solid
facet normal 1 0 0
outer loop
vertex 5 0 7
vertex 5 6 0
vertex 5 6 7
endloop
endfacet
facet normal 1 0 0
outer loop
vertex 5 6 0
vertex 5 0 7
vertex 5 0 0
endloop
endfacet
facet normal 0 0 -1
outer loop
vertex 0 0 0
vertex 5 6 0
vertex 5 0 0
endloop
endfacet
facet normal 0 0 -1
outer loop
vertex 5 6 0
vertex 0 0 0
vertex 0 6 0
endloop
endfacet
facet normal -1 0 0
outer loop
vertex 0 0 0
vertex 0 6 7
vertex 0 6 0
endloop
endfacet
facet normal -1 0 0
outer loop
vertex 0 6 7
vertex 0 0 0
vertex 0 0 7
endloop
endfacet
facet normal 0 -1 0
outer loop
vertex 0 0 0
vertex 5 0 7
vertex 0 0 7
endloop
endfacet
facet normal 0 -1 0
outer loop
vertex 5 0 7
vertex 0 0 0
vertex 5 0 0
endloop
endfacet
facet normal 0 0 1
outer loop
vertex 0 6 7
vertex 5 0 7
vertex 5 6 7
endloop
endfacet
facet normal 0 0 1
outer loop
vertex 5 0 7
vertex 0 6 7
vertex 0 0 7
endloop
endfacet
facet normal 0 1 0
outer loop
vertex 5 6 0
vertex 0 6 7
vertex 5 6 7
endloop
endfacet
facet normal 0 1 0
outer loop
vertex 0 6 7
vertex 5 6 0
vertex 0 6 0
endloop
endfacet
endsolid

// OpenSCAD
translate([2.5, 1.5, 1.0]) color([0.8462248334797323, 0.9789066021625461, 0.6868956228130294]) cube([5, 3, 2], center=true);
translate([2.5, 1.5, 3.0]) color([0.08137290691060206, 0.9493092651810784, 0.9246190463677613]) cube([5, 3, 2], center=true);
translate([2.5, 1.0, 5.5]) color([0.3951154575230438, 0.3612783181755085, 0.11615210489091876]) cube([5, 2, 3], center=true);
translate([2.5, 3.0, 5.5]) color([0.0037403702712440756, 0.2703277384724262, 0.6403732426441148]) cube([5, 2, 3], center=true);
translate([2.5, 4.5, 1.0]) color([0.29252642189785794, 0.9007258804640697, 0.14067978971908934]) cube([5, 3, 2], center=true);
translate([2.5, 4.5, 3.0]) color([0.5728503338092871, 0.1912043400515635, 0.43401891336511733]) cube([5, 3, 2], center=true);
translate([2.5, 5.0, 5.5]) color([0.7163457448050065, 0.3841301513333275, 0.33069552050314754]) cube([5, 2, 3], center=true);
